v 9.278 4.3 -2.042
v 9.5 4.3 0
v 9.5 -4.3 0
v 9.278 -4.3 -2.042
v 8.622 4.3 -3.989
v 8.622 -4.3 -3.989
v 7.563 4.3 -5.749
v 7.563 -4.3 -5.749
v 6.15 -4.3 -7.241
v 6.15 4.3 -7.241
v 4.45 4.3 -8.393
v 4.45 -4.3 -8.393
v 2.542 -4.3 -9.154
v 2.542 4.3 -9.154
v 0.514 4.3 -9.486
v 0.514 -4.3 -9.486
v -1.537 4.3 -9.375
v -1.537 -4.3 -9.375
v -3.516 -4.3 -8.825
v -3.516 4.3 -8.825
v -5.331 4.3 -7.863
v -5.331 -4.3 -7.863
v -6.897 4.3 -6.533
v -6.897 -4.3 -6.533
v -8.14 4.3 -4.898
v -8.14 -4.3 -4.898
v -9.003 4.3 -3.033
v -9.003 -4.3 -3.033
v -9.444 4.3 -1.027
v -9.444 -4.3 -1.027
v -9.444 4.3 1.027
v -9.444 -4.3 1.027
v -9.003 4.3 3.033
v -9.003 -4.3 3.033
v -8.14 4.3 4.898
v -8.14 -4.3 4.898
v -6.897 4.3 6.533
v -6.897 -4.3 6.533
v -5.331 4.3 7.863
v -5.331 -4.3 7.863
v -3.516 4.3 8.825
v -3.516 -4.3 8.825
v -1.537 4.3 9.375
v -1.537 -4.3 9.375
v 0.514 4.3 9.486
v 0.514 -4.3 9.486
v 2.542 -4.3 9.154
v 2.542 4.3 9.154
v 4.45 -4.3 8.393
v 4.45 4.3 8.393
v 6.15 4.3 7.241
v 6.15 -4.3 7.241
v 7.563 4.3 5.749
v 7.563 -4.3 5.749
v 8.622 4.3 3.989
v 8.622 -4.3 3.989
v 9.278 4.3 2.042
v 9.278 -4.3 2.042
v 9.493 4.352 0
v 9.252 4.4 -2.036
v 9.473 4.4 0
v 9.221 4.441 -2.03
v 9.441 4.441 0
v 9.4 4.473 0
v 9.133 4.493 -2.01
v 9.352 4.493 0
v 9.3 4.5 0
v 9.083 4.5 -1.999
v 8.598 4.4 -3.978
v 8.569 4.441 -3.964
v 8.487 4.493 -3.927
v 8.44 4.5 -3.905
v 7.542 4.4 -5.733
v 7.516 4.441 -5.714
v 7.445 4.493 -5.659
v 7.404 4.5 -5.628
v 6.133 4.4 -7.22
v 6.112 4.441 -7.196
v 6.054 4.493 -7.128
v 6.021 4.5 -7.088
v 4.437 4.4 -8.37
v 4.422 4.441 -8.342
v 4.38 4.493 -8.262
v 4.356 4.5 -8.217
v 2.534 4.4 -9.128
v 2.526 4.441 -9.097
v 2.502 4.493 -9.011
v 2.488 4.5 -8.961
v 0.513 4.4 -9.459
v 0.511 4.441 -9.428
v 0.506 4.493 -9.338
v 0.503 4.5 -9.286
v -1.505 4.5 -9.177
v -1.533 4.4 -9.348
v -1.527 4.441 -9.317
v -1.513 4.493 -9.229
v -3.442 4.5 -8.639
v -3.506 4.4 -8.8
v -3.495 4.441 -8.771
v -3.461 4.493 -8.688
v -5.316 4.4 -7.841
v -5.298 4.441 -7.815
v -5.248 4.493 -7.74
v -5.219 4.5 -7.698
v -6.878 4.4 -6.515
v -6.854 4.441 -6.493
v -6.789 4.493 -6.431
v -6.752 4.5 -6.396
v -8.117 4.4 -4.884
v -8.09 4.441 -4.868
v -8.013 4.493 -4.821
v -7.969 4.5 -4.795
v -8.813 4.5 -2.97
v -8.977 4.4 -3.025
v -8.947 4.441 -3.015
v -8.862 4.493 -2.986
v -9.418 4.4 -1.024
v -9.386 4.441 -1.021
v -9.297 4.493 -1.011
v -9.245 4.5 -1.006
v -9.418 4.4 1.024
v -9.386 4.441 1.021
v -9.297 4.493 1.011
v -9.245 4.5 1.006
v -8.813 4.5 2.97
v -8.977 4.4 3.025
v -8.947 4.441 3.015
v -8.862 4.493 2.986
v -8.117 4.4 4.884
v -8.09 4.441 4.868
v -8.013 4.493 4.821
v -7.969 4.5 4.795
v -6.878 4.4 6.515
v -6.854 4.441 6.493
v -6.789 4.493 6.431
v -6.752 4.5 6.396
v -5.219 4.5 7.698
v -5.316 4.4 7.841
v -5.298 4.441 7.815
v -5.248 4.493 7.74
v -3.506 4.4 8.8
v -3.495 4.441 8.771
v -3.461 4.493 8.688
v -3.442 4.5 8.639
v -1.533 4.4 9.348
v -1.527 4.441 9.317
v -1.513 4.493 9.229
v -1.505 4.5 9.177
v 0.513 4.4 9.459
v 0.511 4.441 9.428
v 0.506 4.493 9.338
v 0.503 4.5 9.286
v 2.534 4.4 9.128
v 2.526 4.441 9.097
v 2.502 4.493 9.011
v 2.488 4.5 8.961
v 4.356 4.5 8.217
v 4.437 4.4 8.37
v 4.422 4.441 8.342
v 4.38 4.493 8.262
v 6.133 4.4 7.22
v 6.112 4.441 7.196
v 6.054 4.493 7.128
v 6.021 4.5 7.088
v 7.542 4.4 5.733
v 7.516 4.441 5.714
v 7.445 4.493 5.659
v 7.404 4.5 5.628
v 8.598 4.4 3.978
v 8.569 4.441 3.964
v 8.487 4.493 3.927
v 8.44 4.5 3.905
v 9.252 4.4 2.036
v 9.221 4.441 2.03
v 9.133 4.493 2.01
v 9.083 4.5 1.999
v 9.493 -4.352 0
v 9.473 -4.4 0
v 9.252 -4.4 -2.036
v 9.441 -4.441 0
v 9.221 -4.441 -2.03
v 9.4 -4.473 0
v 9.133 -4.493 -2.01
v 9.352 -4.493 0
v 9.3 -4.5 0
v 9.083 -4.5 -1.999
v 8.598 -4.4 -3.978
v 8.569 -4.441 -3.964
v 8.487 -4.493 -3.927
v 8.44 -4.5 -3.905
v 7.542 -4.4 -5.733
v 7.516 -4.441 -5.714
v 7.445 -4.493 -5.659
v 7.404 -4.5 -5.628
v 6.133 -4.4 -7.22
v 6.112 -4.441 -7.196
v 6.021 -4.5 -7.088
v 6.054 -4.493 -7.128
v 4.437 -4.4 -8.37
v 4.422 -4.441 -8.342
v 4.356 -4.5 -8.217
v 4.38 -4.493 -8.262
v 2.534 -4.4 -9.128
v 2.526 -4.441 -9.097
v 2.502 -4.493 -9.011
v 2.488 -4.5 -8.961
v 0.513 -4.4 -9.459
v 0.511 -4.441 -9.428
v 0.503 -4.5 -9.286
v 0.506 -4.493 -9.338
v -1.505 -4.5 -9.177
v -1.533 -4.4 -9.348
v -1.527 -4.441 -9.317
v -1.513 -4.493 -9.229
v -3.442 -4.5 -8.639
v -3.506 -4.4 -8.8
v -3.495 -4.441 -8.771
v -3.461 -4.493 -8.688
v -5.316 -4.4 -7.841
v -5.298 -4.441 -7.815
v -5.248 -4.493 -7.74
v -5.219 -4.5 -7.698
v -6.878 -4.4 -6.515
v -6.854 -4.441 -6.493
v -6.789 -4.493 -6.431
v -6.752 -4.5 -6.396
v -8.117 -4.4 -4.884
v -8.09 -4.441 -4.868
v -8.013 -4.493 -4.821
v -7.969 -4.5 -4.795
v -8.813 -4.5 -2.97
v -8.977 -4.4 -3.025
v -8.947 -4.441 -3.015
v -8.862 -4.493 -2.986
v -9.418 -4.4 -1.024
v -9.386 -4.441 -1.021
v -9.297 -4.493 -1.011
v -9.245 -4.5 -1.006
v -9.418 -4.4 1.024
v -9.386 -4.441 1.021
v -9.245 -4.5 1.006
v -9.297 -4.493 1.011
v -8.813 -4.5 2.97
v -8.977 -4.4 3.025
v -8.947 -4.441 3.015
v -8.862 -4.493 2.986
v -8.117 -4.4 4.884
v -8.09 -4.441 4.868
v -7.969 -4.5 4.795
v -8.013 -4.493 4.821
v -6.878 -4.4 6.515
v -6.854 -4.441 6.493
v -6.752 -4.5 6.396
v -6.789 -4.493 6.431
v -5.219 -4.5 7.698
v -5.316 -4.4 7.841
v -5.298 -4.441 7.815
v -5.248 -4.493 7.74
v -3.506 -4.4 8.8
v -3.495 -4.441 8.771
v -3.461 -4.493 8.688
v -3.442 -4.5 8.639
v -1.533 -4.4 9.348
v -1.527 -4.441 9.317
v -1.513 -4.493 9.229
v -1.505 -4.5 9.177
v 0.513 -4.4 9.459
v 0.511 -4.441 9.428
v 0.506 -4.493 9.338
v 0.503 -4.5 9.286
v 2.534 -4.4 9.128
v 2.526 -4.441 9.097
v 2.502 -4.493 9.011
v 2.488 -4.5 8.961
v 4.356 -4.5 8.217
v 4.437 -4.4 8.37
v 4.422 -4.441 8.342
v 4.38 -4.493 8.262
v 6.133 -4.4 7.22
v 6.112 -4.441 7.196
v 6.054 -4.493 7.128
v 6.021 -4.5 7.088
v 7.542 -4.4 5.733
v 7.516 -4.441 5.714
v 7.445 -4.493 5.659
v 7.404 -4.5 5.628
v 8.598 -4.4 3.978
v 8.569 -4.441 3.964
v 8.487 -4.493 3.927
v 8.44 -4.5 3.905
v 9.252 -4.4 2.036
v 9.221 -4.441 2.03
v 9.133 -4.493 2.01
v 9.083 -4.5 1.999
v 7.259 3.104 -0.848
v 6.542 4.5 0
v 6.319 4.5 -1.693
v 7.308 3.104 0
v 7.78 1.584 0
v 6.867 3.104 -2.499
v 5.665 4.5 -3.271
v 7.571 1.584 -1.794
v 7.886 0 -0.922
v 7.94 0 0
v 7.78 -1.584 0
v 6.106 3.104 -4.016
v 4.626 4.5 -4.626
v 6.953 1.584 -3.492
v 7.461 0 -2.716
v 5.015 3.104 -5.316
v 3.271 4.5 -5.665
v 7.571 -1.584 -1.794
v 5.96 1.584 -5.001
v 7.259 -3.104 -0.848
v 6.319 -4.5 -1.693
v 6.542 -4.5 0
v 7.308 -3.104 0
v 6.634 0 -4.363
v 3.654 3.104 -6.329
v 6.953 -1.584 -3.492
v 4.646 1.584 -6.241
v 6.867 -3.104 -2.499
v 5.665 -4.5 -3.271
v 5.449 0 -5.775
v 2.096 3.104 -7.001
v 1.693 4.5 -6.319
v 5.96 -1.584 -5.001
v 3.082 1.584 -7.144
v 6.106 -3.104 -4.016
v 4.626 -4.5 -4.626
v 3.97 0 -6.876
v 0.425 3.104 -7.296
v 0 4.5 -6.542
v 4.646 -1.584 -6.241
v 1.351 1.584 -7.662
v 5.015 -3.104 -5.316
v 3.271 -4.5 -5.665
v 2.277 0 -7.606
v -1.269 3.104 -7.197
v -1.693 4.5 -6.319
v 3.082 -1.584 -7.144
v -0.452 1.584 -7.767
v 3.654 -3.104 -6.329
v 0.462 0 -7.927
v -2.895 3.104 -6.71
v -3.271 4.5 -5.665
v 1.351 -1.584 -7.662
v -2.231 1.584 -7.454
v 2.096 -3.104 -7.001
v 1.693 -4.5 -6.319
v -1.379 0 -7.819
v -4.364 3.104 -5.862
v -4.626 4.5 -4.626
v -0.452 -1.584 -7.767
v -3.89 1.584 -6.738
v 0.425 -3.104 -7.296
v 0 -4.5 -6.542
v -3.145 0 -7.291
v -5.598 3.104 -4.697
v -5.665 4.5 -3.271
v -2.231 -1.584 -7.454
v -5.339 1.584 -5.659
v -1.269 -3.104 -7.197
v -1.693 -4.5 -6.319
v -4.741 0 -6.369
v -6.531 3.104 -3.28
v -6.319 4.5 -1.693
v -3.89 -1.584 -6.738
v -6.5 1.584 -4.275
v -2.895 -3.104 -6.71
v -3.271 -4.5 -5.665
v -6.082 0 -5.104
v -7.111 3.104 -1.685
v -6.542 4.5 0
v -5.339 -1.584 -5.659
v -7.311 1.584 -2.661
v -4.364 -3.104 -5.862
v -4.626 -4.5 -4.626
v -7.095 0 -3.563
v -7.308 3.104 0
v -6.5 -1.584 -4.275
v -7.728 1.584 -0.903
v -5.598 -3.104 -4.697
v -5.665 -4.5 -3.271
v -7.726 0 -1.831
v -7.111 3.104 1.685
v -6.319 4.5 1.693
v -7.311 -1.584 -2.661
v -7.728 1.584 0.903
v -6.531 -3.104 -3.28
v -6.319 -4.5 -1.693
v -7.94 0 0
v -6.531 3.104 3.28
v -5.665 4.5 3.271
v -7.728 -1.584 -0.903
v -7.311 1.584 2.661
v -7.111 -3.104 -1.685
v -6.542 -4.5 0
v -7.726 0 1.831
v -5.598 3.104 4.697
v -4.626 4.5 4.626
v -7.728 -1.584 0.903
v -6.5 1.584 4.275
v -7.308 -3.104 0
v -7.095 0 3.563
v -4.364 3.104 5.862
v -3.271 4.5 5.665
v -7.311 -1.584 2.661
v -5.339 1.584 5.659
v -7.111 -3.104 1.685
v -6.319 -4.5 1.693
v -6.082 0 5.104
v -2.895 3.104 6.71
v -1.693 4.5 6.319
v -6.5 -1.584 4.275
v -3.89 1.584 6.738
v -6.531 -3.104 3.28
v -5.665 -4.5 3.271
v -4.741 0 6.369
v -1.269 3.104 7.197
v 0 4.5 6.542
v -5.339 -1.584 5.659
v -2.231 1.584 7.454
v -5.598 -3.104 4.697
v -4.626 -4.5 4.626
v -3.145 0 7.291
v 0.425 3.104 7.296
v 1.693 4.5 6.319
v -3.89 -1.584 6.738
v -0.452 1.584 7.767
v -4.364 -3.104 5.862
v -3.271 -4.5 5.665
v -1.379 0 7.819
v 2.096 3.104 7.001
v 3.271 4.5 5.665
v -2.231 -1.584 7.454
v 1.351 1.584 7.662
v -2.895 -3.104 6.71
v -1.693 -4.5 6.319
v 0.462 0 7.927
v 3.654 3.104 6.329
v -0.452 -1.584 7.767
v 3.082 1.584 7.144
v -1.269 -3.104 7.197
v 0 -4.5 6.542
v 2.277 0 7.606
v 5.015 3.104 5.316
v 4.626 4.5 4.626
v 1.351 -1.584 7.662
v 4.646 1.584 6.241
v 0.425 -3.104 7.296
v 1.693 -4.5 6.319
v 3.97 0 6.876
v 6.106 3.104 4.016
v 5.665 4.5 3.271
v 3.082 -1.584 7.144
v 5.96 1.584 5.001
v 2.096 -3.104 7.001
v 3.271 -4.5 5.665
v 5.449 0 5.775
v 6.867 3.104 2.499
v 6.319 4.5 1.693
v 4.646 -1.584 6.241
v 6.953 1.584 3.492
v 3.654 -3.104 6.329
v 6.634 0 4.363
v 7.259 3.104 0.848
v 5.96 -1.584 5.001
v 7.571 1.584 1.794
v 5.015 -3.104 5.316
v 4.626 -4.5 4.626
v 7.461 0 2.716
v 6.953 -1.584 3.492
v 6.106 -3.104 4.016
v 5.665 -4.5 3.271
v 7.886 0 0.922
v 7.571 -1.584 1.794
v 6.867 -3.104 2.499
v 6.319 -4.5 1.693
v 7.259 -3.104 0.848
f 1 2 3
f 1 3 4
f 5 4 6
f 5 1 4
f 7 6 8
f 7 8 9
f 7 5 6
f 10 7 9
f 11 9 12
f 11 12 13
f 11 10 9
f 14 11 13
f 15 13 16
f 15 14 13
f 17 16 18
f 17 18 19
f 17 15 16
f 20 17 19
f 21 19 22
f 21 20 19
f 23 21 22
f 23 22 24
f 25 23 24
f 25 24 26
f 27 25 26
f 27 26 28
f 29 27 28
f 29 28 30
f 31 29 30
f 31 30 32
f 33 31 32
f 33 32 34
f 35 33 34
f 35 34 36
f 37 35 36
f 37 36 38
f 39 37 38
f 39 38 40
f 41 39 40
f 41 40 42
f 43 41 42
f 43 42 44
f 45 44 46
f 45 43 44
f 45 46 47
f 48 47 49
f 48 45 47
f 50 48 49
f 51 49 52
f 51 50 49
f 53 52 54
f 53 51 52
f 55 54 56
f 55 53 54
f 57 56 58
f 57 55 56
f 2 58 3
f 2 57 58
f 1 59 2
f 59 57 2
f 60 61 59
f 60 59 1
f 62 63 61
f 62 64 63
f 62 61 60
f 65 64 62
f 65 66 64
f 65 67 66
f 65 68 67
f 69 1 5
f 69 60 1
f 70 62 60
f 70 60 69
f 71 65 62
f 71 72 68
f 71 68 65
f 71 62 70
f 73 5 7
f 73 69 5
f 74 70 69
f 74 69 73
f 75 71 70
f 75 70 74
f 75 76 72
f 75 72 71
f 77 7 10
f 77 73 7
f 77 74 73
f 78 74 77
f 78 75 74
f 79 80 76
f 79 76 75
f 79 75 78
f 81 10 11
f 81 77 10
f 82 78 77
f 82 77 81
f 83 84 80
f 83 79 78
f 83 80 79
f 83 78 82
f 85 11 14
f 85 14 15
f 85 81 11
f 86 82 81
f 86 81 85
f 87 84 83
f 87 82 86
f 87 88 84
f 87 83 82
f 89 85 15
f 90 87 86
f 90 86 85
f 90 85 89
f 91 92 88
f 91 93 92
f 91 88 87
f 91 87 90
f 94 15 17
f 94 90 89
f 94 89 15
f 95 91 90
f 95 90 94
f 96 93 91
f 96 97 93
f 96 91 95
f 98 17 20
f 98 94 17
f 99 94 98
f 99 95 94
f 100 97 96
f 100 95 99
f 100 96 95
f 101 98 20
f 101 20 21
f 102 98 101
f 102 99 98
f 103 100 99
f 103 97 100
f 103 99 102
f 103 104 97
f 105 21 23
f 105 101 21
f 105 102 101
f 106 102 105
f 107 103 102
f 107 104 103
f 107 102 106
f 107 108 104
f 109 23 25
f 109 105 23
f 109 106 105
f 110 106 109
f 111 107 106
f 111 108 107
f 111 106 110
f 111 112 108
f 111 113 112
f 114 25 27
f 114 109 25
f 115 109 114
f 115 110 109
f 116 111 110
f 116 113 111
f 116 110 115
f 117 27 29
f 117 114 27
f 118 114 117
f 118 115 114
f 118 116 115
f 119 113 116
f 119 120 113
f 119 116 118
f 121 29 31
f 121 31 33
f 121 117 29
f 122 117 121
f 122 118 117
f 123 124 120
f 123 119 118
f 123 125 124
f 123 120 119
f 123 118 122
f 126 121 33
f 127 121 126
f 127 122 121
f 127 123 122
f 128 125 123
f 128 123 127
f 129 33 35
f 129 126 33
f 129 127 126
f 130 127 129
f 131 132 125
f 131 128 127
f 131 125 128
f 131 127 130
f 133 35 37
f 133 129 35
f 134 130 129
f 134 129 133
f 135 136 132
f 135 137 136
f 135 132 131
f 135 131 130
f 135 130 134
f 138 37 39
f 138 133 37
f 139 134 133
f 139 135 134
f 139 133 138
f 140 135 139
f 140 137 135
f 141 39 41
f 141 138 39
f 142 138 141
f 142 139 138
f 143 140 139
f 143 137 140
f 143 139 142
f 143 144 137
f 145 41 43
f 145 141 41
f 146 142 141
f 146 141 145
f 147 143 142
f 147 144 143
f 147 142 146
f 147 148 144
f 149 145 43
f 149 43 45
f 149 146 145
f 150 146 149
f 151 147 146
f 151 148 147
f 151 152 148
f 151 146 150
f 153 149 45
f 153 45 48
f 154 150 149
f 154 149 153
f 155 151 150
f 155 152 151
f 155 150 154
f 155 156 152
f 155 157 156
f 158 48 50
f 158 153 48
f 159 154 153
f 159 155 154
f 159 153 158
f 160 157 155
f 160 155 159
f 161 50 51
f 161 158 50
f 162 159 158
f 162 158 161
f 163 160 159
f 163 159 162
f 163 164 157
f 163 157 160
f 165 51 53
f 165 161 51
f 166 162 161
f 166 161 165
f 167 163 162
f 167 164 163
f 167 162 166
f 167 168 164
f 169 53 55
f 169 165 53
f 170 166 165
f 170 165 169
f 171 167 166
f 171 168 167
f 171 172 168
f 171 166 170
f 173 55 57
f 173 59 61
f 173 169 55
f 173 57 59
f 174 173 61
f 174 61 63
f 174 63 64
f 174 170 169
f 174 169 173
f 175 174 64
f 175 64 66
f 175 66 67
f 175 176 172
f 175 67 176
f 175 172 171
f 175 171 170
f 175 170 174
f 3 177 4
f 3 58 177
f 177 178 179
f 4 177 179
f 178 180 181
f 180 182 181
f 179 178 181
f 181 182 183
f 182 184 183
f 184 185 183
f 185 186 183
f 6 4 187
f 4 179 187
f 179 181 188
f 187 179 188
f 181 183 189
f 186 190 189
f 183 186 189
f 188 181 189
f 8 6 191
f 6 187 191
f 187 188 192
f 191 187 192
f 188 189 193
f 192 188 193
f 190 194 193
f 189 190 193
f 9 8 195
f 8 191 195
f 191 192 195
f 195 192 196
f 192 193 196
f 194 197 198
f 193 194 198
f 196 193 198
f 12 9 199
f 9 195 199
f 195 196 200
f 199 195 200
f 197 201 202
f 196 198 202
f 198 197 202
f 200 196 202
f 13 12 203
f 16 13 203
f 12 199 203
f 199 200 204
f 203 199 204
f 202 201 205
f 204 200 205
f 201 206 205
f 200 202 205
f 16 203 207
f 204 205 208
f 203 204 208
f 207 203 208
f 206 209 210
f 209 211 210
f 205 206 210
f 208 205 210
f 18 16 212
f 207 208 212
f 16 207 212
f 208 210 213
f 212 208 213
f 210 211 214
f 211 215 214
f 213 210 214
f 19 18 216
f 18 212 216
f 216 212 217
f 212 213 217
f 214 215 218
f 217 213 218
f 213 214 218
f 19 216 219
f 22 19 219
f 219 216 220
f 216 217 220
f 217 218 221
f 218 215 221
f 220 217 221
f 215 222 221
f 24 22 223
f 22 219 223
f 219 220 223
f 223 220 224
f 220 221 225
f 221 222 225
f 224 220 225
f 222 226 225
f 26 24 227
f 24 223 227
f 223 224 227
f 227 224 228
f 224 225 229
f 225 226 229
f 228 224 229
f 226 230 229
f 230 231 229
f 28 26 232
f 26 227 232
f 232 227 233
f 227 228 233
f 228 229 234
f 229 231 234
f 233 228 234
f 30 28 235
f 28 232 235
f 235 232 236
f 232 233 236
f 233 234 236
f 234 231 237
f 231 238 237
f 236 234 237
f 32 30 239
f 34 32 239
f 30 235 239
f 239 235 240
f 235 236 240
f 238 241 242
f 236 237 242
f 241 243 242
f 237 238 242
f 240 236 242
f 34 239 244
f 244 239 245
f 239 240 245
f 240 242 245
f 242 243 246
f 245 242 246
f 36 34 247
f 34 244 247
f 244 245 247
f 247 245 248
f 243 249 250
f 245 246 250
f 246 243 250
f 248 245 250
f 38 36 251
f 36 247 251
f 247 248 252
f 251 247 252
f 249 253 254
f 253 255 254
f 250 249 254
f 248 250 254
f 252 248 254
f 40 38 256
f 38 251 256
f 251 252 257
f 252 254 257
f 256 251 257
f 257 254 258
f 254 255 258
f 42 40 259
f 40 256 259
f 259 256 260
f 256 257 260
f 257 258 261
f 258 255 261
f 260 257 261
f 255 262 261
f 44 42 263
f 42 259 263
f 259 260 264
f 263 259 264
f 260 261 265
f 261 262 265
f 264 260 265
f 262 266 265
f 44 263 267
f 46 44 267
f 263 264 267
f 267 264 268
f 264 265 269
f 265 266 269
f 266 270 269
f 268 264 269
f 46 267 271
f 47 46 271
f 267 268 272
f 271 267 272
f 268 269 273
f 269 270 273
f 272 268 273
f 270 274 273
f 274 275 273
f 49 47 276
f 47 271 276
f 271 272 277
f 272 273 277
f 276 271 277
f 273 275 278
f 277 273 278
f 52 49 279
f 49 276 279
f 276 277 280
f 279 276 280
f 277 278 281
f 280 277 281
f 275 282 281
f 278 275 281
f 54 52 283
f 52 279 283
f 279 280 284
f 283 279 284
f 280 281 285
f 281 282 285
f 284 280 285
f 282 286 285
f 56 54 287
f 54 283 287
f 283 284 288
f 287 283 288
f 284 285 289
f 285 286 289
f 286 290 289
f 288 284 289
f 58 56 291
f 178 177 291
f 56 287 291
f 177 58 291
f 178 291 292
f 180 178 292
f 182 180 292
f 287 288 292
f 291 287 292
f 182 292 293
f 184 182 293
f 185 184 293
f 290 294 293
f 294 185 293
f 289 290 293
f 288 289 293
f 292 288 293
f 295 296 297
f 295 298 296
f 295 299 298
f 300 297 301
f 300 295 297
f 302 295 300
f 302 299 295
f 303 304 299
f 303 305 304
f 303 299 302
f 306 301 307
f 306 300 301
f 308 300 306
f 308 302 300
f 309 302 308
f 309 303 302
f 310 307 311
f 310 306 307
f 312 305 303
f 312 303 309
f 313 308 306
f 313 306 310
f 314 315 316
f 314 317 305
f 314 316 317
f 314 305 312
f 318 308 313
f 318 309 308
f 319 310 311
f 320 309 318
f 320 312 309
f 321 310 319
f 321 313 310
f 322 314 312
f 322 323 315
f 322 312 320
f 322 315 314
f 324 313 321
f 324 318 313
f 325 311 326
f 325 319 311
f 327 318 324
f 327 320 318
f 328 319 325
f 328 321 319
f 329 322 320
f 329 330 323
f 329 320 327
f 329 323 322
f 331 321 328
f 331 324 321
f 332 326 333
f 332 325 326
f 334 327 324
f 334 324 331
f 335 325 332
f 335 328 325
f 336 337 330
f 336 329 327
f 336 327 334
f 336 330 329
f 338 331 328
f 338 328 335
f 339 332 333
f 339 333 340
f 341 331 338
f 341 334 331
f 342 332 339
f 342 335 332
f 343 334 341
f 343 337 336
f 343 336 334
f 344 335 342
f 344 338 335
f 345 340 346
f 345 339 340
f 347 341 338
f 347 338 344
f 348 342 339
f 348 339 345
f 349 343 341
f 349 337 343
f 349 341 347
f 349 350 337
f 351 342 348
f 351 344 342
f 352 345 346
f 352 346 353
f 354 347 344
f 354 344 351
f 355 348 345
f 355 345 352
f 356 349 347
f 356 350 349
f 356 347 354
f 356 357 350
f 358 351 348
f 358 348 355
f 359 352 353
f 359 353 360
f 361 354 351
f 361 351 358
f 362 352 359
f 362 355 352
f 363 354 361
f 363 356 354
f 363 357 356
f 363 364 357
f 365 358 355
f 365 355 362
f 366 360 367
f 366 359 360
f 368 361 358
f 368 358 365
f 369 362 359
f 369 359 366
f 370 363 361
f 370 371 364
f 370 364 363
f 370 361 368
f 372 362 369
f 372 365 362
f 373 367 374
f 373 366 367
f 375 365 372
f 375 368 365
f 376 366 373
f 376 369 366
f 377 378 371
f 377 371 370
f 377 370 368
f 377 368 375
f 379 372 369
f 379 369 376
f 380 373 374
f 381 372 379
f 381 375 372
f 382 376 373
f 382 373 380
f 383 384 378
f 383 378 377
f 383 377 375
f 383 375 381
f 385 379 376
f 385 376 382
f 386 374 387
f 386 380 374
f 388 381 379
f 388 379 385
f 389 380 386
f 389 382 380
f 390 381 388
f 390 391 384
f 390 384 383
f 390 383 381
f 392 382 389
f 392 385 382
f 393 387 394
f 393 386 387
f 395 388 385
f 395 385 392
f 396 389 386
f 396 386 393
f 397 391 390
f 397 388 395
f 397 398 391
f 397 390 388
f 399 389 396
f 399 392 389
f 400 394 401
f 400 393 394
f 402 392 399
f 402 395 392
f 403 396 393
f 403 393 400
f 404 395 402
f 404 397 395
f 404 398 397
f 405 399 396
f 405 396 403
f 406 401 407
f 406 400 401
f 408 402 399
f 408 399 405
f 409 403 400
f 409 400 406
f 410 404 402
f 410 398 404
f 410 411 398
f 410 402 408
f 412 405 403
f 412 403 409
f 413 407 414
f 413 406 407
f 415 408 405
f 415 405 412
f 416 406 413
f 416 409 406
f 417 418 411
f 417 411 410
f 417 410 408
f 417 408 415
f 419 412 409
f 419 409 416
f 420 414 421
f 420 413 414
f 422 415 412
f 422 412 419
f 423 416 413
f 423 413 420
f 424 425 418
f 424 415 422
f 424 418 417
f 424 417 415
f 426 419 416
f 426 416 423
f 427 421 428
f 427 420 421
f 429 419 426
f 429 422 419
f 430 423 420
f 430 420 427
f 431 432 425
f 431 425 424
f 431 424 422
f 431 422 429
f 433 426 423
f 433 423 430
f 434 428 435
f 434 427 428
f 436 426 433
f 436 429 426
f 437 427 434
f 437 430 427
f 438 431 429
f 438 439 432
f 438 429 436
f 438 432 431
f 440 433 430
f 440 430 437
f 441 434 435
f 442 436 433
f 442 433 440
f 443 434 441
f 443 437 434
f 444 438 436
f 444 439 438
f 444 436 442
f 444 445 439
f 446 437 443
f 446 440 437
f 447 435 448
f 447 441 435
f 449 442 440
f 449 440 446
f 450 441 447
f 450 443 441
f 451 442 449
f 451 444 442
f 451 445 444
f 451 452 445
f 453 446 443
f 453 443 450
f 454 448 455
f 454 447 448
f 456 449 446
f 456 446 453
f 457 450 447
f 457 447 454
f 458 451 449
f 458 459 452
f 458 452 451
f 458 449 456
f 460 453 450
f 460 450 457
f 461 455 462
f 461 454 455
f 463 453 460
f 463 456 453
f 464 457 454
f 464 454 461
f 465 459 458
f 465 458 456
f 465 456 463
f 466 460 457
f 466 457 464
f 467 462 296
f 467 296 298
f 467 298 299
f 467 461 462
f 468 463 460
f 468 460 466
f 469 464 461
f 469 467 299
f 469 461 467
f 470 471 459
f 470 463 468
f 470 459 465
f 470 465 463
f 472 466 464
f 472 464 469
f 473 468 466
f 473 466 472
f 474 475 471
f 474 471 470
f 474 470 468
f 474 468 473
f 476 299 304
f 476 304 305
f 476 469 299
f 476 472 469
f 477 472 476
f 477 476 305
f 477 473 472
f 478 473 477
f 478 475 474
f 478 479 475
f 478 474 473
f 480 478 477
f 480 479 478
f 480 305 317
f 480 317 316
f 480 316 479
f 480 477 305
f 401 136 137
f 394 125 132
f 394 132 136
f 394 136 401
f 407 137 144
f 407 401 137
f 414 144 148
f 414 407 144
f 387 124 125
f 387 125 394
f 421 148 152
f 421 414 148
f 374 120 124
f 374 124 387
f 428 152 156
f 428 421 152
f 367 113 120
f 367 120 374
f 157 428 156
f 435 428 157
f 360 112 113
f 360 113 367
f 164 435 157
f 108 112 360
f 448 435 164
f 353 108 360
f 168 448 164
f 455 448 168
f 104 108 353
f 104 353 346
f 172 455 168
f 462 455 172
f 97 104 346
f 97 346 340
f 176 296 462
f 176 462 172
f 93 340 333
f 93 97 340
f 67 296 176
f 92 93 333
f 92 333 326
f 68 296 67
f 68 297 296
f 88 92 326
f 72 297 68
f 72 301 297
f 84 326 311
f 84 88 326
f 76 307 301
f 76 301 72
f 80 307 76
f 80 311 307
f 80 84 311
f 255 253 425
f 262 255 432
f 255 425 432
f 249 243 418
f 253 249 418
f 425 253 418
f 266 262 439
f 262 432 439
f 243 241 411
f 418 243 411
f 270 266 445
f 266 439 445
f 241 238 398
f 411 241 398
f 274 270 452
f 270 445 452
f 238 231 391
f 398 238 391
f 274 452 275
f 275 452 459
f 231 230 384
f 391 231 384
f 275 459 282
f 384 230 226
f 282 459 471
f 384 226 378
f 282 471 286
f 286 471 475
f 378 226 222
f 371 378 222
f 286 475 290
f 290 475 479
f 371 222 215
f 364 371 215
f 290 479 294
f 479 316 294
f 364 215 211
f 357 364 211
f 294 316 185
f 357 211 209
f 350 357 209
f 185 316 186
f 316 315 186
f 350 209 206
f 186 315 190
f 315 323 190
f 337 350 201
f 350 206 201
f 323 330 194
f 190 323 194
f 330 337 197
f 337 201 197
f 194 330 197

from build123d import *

# Parameters (mm, degrees)
SZKIC1_R                    = 9.5
DODANIE_WYCI_GNI_CIE1_DEPTH = 4.5
ZAOKR_GLENIE1_R             = 0.2


with BuildPart() as part:
    # Szkic1 → Dodanie-wyciągnięcie1 (new body, symmetric)
    with BuildSketch(Plane(origin=(0, 0, 0), x_dir=(1, 0, 0), z_dir=(0, 1, 0))):
        Circle(SZKIC1_R)
    extrude(amount=DODANIE_WYCI_GNI_CIE1_DEPTH, both=True)

    # Szkic3 → Wycięcie-obrót1 (revolve, cut)
    with BuildSketch(Plane.XY):
        with BuildLine():
            Line((0, -7.94), (0, 7.94))
            ThreePointArc((0, 7.94), (7.94, 0), (0, -7.94))
        make_face()
    revolve(axis=Axis((0, -7.94, 0), (0, 1, 0)), mode=Mode.SUBTRACT)

    # Zaokrąglenie1
    zaokr_glenie1_edges = [part.edges().sort_by_distance(p)[0] for p in [
        (-9.5, -4.5, 0),
        (-9.5, 4.5, 0),
    ]]
    fillet(zaokr_glenie1_edges, radius=ZAOKR_GLENIE1_R)


solid = part.part
